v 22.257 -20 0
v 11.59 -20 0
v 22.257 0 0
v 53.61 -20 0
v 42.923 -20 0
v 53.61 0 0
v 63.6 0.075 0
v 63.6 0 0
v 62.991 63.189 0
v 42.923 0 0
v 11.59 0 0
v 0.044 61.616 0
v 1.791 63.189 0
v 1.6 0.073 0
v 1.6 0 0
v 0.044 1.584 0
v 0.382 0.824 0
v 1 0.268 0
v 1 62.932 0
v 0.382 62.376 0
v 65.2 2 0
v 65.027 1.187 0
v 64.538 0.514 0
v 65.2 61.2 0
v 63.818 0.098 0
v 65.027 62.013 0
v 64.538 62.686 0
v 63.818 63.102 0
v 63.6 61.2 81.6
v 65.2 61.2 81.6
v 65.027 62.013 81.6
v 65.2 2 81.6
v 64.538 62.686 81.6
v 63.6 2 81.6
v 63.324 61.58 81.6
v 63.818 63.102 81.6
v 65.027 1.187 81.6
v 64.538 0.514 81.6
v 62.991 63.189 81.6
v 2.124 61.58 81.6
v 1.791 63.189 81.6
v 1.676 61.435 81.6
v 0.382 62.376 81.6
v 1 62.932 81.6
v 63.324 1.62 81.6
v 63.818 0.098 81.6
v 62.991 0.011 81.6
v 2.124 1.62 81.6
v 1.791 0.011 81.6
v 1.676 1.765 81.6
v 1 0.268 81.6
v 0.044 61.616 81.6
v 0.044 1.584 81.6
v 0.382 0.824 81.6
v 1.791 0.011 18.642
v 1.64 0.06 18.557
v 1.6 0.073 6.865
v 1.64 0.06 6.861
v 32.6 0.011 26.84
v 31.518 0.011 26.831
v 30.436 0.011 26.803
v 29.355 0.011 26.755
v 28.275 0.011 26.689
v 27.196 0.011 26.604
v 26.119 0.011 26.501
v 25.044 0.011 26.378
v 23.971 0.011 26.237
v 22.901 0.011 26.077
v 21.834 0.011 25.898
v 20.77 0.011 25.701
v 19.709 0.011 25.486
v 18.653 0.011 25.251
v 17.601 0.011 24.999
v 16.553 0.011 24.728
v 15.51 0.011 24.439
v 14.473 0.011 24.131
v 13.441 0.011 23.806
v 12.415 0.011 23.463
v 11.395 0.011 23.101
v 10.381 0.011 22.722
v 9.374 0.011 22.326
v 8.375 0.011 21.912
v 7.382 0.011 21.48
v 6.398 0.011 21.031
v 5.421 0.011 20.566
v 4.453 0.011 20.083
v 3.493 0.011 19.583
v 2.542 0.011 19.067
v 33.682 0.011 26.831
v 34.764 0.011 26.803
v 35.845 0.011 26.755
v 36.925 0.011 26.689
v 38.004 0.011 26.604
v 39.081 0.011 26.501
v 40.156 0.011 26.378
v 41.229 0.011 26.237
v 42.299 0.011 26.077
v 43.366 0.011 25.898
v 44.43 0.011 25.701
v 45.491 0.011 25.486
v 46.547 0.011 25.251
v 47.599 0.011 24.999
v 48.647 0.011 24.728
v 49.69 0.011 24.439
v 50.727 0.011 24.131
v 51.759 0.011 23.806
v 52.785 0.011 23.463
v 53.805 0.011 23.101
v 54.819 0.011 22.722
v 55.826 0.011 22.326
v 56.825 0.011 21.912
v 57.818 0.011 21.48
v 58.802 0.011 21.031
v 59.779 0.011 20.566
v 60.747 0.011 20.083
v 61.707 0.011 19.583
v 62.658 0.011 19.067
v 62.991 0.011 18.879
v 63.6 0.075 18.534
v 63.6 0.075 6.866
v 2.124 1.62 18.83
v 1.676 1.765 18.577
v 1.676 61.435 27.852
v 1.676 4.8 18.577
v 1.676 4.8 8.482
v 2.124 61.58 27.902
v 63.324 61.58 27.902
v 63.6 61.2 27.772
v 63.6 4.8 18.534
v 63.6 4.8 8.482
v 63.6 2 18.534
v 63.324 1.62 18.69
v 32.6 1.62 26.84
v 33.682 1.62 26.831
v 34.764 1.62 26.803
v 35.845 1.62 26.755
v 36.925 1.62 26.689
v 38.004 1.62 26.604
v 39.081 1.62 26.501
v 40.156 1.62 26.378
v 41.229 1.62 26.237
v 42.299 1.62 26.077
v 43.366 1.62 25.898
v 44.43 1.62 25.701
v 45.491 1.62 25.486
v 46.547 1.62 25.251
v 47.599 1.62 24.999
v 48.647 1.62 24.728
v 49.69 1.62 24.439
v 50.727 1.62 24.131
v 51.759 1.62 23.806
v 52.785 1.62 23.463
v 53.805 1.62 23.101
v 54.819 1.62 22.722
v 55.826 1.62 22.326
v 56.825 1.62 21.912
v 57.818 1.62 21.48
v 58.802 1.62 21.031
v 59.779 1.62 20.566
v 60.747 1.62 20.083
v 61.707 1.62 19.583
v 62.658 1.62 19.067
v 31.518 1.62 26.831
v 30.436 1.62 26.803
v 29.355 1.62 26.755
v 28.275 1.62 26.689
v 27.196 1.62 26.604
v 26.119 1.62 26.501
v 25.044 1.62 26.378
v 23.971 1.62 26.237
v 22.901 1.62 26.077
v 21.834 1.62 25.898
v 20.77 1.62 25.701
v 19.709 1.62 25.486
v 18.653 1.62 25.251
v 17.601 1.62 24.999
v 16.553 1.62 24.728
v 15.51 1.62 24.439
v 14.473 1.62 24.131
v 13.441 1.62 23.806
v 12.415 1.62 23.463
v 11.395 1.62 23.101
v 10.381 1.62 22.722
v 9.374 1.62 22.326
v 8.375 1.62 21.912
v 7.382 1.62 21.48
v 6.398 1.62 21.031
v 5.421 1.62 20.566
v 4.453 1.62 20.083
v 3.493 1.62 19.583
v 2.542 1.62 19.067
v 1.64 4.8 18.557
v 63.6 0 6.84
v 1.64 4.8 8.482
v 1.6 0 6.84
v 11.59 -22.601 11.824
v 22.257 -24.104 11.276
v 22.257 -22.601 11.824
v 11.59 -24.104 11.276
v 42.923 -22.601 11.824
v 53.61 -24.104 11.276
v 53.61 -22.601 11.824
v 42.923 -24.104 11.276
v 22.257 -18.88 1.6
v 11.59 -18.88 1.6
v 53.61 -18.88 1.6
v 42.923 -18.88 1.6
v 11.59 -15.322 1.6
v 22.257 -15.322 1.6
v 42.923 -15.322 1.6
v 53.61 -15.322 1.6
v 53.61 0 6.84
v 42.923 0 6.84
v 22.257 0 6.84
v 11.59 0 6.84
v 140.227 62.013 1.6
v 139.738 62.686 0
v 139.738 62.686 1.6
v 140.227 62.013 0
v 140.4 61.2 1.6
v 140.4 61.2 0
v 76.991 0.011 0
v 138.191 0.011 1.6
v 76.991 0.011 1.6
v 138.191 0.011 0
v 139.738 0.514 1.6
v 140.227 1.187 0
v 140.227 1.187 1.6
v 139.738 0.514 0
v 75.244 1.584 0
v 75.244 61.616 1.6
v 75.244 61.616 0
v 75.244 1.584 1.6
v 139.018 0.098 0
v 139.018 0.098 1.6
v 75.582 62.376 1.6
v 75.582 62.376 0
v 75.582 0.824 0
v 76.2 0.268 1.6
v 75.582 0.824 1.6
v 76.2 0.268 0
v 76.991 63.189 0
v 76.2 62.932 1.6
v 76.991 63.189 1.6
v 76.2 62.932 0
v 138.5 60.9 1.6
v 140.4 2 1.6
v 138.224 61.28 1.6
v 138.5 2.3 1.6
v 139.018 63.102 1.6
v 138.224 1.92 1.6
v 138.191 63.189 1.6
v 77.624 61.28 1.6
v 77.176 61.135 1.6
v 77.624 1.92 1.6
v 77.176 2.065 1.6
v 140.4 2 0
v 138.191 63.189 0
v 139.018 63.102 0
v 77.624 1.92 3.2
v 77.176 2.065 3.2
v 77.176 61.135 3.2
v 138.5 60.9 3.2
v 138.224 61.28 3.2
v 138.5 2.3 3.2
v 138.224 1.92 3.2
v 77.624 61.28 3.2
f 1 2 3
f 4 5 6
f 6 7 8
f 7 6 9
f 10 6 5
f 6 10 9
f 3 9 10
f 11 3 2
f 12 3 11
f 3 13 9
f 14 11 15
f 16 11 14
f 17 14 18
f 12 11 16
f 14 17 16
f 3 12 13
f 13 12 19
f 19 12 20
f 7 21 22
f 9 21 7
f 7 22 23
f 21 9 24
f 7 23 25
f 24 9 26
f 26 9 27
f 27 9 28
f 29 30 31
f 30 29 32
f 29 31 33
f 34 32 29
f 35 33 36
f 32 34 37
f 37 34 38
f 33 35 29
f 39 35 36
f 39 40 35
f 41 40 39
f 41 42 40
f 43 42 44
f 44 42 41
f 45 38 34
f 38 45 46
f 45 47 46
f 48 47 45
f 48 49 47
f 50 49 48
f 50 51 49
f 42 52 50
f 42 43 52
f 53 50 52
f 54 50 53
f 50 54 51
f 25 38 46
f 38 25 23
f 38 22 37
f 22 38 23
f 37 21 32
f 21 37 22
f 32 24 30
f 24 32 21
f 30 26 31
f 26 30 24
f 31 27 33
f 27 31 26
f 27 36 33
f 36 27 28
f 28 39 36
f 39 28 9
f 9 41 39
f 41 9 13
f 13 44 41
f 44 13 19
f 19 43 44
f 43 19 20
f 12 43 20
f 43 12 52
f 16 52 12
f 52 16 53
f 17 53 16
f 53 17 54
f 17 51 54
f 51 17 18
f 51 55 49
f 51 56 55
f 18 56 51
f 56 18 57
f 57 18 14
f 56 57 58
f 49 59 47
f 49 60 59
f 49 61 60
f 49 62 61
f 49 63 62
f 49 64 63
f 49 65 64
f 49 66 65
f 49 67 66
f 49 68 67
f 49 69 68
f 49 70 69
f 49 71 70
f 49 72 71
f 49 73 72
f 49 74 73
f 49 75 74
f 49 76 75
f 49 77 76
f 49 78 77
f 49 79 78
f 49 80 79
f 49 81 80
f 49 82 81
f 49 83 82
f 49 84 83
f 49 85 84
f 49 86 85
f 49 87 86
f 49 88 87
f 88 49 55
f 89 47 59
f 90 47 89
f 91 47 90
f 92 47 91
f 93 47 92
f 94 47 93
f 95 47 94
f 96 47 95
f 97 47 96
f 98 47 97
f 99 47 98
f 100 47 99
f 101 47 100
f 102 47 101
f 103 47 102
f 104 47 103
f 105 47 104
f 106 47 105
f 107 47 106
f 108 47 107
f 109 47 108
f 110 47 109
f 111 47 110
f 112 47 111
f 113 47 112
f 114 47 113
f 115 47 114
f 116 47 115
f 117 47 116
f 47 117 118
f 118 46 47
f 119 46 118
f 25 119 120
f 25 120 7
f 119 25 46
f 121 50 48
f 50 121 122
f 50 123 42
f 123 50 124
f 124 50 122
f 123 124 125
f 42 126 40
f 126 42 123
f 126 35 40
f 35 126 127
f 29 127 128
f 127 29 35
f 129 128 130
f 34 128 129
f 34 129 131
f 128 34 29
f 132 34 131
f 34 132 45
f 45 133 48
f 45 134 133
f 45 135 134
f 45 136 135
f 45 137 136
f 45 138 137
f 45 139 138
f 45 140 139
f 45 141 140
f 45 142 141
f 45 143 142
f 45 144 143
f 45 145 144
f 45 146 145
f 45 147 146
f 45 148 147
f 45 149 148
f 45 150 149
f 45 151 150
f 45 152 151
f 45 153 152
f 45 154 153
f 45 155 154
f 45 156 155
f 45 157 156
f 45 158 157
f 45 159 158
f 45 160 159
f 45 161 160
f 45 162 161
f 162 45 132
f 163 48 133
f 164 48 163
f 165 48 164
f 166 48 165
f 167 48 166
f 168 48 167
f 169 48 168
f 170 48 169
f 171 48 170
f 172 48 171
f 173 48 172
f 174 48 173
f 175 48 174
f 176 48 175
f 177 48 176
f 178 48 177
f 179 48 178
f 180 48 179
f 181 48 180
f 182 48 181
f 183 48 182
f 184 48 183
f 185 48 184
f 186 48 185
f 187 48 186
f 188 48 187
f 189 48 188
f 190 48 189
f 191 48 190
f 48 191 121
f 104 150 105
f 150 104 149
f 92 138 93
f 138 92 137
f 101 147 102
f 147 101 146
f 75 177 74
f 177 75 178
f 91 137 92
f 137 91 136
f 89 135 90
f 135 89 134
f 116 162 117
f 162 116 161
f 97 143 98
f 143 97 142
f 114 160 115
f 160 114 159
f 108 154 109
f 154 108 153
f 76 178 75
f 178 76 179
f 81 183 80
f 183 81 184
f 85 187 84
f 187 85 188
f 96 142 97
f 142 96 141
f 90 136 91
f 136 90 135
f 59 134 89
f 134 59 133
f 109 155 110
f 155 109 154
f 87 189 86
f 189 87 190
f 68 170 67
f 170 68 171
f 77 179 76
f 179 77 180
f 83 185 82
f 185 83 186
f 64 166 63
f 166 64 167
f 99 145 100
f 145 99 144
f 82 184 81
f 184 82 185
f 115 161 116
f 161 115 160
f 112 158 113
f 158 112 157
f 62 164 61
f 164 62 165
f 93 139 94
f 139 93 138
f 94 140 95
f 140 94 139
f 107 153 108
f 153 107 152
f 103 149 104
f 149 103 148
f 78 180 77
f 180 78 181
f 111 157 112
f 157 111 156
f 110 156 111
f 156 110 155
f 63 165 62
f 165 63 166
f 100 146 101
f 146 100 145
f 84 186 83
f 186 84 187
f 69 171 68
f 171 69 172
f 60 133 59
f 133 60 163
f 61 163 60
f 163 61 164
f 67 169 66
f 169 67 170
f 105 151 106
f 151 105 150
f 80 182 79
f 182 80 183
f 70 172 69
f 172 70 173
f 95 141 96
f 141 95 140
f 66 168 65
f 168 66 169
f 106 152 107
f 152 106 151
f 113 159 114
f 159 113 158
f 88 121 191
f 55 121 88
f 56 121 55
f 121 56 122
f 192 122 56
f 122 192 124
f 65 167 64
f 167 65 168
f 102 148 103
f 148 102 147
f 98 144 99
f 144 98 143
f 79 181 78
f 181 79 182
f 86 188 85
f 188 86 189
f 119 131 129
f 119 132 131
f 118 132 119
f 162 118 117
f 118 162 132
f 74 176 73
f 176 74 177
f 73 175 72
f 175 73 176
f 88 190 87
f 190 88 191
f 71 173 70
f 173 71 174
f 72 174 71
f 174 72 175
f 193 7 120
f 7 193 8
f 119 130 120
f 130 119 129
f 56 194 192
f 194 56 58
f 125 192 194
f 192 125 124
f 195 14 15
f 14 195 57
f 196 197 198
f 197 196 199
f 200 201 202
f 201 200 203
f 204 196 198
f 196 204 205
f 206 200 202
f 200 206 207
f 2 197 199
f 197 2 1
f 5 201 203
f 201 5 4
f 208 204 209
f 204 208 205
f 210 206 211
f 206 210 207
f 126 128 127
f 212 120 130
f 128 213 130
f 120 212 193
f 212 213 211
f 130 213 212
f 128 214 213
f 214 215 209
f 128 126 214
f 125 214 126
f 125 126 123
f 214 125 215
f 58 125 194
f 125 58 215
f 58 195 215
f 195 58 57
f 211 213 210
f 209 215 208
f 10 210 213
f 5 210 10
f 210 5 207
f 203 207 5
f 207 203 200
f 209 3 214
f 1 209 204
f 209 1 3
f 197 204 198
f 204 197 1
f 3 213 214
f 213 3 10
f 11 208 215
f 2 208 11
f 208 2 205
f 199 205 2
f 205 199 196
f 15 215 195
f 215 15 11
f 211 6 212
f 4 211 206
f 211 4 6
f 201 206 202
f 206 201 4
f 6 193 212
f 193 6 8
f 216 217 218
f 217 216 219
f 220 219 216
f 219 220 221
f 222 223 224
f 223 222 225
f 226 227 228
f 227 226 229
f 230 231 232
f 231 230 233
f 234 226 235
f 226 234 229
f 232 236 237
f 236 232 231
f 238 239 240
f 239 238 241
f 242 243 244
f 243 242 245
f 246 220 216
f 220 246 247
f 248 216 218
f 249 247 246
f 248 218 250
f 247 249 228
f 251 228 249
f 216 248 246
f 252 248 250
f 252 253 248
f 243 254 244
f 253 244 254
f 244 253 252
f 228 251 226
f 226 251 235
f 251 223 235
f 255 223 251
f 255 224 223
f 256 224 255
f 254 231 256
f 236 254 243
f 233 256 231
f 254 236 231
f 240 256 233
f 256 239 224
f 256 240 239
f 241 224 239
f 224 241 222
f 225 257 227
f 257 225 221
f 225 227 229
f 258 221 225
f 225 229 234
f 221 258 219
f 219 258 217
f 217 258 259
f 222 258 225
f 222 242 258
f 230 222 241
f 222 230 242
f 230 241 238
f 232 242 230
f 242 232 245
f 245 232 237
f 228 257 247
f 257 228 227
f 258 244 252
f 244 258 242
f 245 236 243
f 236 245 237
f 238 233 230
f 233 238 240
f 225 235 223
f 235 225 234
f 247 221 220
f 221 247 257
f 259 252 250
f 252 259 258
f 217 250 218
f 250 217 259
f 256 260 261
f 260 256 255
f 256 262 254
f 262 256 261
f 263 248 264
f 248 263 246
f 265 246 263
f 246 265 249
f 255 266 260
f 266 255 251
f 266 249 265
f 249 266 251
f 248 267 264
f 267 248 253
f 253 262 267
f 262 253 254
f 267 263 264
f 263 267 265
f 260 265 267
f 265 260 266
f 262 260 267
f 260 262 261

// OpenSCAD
// file: libs/rounded_shapes.scad
$fa = 1;
$fs = 1.75 / 2;

module rounded_square(width, height, border_radius) {
    translate([border_radius, border_radius])
    minkowski() {
        border_diameter = border_radius * 2;

        square(
            size = [
                width - border_diameter,
                height - border_diameter
            ]
        );
        circle(r = border_radius);
    }
}
// main file
include<libs/rounded_shapes.scad>;

$fa = 1;
$fs = 1.75 / 2;

// Inner dimensions
width = 62;
depth = 60;
height = 80;

wall_thickness = 1.6;
border_radius = 2;

pickup_length = 20;
slide_angle = 20;

pickup_front_face_height = sin(slide_angle) * pickup_length;
slide_depth = depth + wall_thickness + pickup_length;
slide_height = sin(slide_angle) * slide_depth;
slide_lip_length = 12;

outer_width = width + wall_thickness * 2;
outer_depth = depth + wall_thickness * 2;

difference() {
    // Main body
    union() {
        // outer wall
        linear_extrude(height = height + wall_thickness)
        difference() {
            rounded_square(outer_width, outer_depth, border_radius);

            translate([wall_thickness, wall_thickness])
            rounded_square(width, depth, border_radius - wall_thickness);
        }

        // Base
        linear_extrude(height = wall_thickness)
        translate([wall_thickness, wall_thickness])
        rounded_square(width, depth, border_radius);
    }

    // Slide top cutout
    intersection() {
        translate([
            wall_thickness + width / 2,
            -wall_thickness / 2,
            -width + pickup_front_face_height + height / 4
            //-height / 2 - pickup_front_face_height,
        ])
        rotate([-90, 0, 0])
        cylinder(r = width, h = depth);

        translate([wall_thickness + 0.04, -0.0, pickup_front_face_height])
        cube([width - 0.04, wall_thickness * 3, height]);
    }
}

difference() {
    union() {
        // Slide
        translate([wall_thickness, -pickup_length, 0])
        polyhedron(
            points = [
                [0, 0, 0],
                [width, 0, 0],
                [width, slide_depth, 0],
                [0, slide_depth, 0],
                [0, slide_depth, slide_height],
                [width, slide_depth, slide_height],
            ],
            faces = [
                [0, 1, 2, 3],
                [5, 4, 3, 2],
                [0, 4, 5, 1],
                [0, 3, 4],
                [5, 2, 1],
            ]
        );

        // Slide lip
        union() {
            translate([wall_thickness, -pickup_length, 0])
            rotate([slide_angle, 0, 0])
            cube([width, wall_thickness, slide_lip_length]);

            translate([wall_thickness, -pickup_length, 0])
            cube([width, depth, wall_thickness]);
        }
    }

    // Pickup area cutouts
    translate([wall_thickness - 0.01 + width / 3, -pickup_length - 20, -0.01])
    cube([width / 3, pickup_length + 20, height]);

    translate([wall_thickness - 0.01, -pickup_length - 20, -0.01])
    cube([10, pickup_length + 20, height]);

    translate([width - 10 + wall_thickness + 0.01, -pickup_length - 20, -0.01])
    cube([10, pickup_length + 20, height]);
}


// Lid (offset for printing easily)
translate([width + wall_thickness * 2 + 10, 0, 0])
union() {
    tolerance = 0.6;

    linear_extrude(height = wall_thickness)
    rounded_square(outer_width, outer_depth, border_radius);

    translate([wall_thickness + tolerance / 2, wall_thickness + tolerance / 2, wall_thickness])
    linear_extrude(height = wall_thickness)
    rounded_square(width - tolerance, depth - tolerance, border_radius - wall_thickness);
}
